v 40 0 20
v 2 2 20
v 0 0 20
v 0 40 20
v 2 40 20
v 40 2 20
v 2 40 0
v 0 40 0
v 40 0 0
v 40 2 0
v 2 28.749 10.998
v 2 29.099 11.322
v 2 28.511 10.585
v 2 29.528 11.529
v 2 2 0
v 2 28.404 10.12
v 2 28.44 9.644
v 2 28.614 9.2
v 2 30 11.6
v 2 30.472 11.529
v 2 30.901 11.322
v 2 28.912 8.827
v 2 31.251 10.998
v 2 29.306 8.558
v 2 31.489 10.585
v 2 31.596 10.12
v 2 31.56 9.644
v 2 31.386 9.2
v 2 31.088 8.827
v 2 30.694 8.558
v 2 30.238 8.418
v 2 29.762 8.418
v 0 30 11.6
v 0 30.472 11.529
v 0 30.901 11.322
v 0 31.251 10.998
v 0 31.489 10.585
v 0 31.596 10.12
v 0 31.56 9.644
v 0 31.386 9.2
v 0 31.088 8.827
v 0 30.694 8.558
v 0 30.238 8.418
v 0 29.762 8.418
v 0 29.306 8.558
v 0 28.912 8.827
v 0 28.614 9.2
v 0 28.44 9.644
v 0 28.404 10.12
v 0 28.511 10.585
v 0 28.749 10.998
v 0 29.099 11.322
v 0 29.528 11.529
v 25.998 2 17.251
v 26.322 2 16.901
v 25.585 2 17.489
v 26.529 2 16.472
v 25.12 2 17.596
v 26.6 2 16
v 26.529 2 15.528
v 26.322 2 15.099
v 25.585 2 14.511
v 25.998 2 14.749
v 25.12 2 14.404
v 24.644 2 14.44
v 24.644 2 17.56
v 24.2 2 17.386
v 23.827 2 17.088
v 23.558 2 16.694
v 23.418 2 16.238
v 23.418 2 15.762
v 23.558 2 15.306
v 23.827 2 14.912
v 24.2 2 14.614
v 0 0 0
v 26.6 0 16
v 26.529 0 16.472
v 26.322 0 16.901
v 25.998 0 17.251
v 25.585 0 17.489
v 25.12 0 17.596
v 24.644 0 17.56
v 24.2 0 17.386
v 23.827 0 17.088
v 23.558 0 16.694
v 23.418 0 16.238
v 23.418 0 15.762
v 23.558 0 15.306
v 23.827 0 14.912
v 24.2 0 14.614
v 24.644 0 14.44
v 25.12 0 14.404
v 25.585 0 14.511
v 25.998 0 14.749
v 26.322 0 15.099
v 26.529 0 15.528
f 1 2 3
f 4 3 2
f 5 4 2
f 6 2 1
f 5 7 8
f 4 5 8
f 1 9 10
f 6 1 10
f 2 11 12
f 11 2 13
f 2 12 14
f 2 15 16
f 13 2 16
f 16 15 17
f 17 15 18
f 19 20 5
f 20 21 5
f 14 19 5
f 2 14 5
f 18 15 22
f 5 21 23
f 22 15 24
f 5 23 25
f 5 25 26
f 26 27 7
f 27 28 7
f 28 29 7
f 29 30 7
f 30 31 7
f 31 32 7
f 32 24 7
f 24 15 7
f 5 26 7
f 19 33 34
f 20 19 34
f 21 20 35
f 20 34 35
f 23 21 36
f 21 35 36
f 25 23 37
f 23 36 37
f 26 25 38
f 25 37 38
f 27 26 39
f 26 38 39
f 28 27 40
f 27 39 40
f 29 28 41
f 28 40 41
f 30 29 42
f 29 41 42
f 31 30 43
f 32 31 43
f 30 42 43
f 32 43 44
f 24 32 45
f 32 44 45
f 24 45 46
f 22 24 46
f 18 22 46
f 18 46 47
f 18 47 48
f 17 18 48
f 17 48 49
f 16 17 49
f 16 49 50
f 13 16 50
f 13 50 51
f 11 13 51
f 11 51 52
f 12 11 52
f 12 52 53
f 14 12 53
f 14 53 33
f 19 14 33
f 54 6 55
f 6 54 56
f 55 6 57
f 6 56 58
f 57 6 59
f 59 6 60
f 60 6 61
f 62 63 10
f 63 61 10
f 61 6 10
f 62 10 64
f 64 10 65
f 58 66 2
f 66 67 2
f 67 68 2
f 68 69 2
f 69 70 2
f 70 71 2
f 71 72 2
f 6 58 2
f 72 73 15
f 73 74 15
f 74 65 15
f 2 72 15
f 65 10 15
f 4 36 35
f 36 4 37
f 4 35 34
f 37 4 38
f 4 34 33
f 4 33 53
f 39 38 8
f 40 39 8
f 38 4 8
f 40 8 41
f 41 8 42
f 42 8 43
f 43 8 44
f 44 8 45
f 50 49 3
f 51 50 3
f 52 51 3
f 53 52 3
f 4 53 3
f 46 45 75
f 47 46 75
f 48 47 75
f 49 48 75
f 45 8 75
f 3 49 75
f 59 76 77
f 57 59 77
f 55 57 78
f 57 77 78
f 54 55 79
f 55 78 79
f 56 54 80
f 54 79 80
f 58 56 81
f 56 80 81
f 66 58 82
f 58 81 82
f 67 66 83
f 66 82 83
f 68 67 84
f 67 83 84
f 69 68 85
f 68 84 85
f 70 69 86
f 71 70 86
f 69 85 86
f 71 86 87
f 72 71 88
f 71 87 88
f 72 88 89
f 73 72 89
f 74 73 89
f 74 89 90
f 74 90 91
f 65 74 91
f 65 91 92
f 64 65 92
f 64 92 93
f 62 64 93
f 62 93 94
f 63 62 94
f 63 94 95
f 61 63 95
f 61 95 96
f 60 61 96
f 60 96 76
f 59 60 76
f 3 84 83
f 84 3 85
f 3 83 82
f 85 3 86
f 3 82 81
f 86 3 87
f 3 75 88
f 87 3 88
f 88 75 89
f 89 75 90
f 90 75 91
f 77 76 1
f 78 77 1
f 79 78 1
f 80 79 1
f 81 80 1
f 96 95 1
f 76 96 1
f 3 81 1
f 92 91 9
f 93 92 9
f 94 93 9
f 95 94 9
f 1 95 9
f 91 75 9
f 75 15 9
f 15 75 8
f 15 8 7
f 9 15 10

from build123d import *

# Parameters (mm, degrees)
EXTRUDE_1_DEPTH     = 20
SKETCH_3_R          = 1.6
CUT_EXTRUDE_2_DEPTH = 41
SKETCH_4_R          = 1.6
CUT_EXTRUDE_3_DEPTH = 41


with BuildPart() as part:
    # Эскиз1 → Бобышка-Вытянуть1 (new body)
    with BuildSketch(Plane.XY):
        Polygon((0, 0), (40, 0), (40, 2), (2, 2), (2, 40), (0, 40), align=None)
    extrude(amount=EXTRUDE_1_DEPTH)

    # Эскиз3 → Вырез-Вытянуть2 (cut, through all)
    with BuildSketch(Plane.ZY):
        with Locations((10, 30)):
            Circle(SKETCH_3_R)
    extrude(amount=-CUT_EXTRUDE_2_DEPTH, mode=Mode.SUBTRACT)

    # Эскиз4 → Вырез-Вытянуть3 (cut, through all)
    with BuildSketch(Plane.XZ):
        with Locations((25, 16)):
            Circle(SKETCH_4_R)
    extrude(amount=-CUT_EXTRUDE_3_DEPTH, mode=Mode.SUBTRACT)


solid = part.part
